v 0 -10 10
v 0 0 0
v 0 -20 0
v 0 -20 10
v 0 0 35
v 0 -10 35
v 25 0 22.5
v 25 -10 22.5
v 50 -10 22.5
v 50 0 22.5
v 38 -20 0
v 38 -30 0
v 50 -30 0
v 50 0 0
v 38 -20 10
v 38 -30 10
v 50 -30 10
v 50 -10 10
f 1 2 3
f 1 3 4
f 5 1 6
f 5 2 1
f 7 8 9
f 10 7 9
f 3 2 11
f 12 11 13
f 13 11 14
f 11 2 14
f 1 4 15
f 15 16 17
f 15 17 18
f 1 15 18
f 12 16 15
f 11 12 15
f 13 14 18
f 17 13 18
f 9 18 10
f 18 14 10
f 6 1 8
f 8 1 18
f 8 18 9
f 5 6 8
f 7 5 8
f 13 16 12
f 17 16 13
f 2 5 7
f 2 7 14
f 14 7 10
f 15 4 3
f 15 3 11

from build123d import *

# Parameters (mm, degrees)
F0_W     = 50
F0_H     = 35
F1_DEPTH = 30
F2_W     = 20
F2_H     = 25
F3_DEPTH = 50.001
F4_W     = 38
F4_H     = 10
F5_DEPTH = 10.001
F7_DEPTH = 10.001


with BuildPart() as f1:
    # F0 (on Front) → F1 (new body)
    with BuildSketch(Plane.XZ):
        with Locations((25, 17.5)):
            Rectangle(F0_W, F0_H)
    extrude(amount=F1_DEPTH)

    # F2 (on face) → F3 (cut, through all)
    with BuildSketch(Plane.YZ.offset(50)):
        with Locations((-20, 22.5)):
            Rectangle(F2_W, F2_H)
    extrude(amount=-F3_DEPTH, mode=Mode.SUBTRACT)

    # F4 (on face) → F5 (cut, through all)
    with BuildSketch(Plane.XY.offset(10)):
        with Locations((19, -25)):
            Rectangle(F4_W, F4_H)
    extrude(amount=-F5_DEPTH, mode=Mode.SUBTRACT)

    # F6 (on face) → F7 (cut, through all)
    with BuildSketch(Plane.XZ.offset(10)):
        Polygon((50, 35), (0, 35), (25, 22.5), (50, 22.5), align=None)
    extrude(amount=-F7_DEPTH, mode=Mode.SUBTRACT)


solid = f1.part
